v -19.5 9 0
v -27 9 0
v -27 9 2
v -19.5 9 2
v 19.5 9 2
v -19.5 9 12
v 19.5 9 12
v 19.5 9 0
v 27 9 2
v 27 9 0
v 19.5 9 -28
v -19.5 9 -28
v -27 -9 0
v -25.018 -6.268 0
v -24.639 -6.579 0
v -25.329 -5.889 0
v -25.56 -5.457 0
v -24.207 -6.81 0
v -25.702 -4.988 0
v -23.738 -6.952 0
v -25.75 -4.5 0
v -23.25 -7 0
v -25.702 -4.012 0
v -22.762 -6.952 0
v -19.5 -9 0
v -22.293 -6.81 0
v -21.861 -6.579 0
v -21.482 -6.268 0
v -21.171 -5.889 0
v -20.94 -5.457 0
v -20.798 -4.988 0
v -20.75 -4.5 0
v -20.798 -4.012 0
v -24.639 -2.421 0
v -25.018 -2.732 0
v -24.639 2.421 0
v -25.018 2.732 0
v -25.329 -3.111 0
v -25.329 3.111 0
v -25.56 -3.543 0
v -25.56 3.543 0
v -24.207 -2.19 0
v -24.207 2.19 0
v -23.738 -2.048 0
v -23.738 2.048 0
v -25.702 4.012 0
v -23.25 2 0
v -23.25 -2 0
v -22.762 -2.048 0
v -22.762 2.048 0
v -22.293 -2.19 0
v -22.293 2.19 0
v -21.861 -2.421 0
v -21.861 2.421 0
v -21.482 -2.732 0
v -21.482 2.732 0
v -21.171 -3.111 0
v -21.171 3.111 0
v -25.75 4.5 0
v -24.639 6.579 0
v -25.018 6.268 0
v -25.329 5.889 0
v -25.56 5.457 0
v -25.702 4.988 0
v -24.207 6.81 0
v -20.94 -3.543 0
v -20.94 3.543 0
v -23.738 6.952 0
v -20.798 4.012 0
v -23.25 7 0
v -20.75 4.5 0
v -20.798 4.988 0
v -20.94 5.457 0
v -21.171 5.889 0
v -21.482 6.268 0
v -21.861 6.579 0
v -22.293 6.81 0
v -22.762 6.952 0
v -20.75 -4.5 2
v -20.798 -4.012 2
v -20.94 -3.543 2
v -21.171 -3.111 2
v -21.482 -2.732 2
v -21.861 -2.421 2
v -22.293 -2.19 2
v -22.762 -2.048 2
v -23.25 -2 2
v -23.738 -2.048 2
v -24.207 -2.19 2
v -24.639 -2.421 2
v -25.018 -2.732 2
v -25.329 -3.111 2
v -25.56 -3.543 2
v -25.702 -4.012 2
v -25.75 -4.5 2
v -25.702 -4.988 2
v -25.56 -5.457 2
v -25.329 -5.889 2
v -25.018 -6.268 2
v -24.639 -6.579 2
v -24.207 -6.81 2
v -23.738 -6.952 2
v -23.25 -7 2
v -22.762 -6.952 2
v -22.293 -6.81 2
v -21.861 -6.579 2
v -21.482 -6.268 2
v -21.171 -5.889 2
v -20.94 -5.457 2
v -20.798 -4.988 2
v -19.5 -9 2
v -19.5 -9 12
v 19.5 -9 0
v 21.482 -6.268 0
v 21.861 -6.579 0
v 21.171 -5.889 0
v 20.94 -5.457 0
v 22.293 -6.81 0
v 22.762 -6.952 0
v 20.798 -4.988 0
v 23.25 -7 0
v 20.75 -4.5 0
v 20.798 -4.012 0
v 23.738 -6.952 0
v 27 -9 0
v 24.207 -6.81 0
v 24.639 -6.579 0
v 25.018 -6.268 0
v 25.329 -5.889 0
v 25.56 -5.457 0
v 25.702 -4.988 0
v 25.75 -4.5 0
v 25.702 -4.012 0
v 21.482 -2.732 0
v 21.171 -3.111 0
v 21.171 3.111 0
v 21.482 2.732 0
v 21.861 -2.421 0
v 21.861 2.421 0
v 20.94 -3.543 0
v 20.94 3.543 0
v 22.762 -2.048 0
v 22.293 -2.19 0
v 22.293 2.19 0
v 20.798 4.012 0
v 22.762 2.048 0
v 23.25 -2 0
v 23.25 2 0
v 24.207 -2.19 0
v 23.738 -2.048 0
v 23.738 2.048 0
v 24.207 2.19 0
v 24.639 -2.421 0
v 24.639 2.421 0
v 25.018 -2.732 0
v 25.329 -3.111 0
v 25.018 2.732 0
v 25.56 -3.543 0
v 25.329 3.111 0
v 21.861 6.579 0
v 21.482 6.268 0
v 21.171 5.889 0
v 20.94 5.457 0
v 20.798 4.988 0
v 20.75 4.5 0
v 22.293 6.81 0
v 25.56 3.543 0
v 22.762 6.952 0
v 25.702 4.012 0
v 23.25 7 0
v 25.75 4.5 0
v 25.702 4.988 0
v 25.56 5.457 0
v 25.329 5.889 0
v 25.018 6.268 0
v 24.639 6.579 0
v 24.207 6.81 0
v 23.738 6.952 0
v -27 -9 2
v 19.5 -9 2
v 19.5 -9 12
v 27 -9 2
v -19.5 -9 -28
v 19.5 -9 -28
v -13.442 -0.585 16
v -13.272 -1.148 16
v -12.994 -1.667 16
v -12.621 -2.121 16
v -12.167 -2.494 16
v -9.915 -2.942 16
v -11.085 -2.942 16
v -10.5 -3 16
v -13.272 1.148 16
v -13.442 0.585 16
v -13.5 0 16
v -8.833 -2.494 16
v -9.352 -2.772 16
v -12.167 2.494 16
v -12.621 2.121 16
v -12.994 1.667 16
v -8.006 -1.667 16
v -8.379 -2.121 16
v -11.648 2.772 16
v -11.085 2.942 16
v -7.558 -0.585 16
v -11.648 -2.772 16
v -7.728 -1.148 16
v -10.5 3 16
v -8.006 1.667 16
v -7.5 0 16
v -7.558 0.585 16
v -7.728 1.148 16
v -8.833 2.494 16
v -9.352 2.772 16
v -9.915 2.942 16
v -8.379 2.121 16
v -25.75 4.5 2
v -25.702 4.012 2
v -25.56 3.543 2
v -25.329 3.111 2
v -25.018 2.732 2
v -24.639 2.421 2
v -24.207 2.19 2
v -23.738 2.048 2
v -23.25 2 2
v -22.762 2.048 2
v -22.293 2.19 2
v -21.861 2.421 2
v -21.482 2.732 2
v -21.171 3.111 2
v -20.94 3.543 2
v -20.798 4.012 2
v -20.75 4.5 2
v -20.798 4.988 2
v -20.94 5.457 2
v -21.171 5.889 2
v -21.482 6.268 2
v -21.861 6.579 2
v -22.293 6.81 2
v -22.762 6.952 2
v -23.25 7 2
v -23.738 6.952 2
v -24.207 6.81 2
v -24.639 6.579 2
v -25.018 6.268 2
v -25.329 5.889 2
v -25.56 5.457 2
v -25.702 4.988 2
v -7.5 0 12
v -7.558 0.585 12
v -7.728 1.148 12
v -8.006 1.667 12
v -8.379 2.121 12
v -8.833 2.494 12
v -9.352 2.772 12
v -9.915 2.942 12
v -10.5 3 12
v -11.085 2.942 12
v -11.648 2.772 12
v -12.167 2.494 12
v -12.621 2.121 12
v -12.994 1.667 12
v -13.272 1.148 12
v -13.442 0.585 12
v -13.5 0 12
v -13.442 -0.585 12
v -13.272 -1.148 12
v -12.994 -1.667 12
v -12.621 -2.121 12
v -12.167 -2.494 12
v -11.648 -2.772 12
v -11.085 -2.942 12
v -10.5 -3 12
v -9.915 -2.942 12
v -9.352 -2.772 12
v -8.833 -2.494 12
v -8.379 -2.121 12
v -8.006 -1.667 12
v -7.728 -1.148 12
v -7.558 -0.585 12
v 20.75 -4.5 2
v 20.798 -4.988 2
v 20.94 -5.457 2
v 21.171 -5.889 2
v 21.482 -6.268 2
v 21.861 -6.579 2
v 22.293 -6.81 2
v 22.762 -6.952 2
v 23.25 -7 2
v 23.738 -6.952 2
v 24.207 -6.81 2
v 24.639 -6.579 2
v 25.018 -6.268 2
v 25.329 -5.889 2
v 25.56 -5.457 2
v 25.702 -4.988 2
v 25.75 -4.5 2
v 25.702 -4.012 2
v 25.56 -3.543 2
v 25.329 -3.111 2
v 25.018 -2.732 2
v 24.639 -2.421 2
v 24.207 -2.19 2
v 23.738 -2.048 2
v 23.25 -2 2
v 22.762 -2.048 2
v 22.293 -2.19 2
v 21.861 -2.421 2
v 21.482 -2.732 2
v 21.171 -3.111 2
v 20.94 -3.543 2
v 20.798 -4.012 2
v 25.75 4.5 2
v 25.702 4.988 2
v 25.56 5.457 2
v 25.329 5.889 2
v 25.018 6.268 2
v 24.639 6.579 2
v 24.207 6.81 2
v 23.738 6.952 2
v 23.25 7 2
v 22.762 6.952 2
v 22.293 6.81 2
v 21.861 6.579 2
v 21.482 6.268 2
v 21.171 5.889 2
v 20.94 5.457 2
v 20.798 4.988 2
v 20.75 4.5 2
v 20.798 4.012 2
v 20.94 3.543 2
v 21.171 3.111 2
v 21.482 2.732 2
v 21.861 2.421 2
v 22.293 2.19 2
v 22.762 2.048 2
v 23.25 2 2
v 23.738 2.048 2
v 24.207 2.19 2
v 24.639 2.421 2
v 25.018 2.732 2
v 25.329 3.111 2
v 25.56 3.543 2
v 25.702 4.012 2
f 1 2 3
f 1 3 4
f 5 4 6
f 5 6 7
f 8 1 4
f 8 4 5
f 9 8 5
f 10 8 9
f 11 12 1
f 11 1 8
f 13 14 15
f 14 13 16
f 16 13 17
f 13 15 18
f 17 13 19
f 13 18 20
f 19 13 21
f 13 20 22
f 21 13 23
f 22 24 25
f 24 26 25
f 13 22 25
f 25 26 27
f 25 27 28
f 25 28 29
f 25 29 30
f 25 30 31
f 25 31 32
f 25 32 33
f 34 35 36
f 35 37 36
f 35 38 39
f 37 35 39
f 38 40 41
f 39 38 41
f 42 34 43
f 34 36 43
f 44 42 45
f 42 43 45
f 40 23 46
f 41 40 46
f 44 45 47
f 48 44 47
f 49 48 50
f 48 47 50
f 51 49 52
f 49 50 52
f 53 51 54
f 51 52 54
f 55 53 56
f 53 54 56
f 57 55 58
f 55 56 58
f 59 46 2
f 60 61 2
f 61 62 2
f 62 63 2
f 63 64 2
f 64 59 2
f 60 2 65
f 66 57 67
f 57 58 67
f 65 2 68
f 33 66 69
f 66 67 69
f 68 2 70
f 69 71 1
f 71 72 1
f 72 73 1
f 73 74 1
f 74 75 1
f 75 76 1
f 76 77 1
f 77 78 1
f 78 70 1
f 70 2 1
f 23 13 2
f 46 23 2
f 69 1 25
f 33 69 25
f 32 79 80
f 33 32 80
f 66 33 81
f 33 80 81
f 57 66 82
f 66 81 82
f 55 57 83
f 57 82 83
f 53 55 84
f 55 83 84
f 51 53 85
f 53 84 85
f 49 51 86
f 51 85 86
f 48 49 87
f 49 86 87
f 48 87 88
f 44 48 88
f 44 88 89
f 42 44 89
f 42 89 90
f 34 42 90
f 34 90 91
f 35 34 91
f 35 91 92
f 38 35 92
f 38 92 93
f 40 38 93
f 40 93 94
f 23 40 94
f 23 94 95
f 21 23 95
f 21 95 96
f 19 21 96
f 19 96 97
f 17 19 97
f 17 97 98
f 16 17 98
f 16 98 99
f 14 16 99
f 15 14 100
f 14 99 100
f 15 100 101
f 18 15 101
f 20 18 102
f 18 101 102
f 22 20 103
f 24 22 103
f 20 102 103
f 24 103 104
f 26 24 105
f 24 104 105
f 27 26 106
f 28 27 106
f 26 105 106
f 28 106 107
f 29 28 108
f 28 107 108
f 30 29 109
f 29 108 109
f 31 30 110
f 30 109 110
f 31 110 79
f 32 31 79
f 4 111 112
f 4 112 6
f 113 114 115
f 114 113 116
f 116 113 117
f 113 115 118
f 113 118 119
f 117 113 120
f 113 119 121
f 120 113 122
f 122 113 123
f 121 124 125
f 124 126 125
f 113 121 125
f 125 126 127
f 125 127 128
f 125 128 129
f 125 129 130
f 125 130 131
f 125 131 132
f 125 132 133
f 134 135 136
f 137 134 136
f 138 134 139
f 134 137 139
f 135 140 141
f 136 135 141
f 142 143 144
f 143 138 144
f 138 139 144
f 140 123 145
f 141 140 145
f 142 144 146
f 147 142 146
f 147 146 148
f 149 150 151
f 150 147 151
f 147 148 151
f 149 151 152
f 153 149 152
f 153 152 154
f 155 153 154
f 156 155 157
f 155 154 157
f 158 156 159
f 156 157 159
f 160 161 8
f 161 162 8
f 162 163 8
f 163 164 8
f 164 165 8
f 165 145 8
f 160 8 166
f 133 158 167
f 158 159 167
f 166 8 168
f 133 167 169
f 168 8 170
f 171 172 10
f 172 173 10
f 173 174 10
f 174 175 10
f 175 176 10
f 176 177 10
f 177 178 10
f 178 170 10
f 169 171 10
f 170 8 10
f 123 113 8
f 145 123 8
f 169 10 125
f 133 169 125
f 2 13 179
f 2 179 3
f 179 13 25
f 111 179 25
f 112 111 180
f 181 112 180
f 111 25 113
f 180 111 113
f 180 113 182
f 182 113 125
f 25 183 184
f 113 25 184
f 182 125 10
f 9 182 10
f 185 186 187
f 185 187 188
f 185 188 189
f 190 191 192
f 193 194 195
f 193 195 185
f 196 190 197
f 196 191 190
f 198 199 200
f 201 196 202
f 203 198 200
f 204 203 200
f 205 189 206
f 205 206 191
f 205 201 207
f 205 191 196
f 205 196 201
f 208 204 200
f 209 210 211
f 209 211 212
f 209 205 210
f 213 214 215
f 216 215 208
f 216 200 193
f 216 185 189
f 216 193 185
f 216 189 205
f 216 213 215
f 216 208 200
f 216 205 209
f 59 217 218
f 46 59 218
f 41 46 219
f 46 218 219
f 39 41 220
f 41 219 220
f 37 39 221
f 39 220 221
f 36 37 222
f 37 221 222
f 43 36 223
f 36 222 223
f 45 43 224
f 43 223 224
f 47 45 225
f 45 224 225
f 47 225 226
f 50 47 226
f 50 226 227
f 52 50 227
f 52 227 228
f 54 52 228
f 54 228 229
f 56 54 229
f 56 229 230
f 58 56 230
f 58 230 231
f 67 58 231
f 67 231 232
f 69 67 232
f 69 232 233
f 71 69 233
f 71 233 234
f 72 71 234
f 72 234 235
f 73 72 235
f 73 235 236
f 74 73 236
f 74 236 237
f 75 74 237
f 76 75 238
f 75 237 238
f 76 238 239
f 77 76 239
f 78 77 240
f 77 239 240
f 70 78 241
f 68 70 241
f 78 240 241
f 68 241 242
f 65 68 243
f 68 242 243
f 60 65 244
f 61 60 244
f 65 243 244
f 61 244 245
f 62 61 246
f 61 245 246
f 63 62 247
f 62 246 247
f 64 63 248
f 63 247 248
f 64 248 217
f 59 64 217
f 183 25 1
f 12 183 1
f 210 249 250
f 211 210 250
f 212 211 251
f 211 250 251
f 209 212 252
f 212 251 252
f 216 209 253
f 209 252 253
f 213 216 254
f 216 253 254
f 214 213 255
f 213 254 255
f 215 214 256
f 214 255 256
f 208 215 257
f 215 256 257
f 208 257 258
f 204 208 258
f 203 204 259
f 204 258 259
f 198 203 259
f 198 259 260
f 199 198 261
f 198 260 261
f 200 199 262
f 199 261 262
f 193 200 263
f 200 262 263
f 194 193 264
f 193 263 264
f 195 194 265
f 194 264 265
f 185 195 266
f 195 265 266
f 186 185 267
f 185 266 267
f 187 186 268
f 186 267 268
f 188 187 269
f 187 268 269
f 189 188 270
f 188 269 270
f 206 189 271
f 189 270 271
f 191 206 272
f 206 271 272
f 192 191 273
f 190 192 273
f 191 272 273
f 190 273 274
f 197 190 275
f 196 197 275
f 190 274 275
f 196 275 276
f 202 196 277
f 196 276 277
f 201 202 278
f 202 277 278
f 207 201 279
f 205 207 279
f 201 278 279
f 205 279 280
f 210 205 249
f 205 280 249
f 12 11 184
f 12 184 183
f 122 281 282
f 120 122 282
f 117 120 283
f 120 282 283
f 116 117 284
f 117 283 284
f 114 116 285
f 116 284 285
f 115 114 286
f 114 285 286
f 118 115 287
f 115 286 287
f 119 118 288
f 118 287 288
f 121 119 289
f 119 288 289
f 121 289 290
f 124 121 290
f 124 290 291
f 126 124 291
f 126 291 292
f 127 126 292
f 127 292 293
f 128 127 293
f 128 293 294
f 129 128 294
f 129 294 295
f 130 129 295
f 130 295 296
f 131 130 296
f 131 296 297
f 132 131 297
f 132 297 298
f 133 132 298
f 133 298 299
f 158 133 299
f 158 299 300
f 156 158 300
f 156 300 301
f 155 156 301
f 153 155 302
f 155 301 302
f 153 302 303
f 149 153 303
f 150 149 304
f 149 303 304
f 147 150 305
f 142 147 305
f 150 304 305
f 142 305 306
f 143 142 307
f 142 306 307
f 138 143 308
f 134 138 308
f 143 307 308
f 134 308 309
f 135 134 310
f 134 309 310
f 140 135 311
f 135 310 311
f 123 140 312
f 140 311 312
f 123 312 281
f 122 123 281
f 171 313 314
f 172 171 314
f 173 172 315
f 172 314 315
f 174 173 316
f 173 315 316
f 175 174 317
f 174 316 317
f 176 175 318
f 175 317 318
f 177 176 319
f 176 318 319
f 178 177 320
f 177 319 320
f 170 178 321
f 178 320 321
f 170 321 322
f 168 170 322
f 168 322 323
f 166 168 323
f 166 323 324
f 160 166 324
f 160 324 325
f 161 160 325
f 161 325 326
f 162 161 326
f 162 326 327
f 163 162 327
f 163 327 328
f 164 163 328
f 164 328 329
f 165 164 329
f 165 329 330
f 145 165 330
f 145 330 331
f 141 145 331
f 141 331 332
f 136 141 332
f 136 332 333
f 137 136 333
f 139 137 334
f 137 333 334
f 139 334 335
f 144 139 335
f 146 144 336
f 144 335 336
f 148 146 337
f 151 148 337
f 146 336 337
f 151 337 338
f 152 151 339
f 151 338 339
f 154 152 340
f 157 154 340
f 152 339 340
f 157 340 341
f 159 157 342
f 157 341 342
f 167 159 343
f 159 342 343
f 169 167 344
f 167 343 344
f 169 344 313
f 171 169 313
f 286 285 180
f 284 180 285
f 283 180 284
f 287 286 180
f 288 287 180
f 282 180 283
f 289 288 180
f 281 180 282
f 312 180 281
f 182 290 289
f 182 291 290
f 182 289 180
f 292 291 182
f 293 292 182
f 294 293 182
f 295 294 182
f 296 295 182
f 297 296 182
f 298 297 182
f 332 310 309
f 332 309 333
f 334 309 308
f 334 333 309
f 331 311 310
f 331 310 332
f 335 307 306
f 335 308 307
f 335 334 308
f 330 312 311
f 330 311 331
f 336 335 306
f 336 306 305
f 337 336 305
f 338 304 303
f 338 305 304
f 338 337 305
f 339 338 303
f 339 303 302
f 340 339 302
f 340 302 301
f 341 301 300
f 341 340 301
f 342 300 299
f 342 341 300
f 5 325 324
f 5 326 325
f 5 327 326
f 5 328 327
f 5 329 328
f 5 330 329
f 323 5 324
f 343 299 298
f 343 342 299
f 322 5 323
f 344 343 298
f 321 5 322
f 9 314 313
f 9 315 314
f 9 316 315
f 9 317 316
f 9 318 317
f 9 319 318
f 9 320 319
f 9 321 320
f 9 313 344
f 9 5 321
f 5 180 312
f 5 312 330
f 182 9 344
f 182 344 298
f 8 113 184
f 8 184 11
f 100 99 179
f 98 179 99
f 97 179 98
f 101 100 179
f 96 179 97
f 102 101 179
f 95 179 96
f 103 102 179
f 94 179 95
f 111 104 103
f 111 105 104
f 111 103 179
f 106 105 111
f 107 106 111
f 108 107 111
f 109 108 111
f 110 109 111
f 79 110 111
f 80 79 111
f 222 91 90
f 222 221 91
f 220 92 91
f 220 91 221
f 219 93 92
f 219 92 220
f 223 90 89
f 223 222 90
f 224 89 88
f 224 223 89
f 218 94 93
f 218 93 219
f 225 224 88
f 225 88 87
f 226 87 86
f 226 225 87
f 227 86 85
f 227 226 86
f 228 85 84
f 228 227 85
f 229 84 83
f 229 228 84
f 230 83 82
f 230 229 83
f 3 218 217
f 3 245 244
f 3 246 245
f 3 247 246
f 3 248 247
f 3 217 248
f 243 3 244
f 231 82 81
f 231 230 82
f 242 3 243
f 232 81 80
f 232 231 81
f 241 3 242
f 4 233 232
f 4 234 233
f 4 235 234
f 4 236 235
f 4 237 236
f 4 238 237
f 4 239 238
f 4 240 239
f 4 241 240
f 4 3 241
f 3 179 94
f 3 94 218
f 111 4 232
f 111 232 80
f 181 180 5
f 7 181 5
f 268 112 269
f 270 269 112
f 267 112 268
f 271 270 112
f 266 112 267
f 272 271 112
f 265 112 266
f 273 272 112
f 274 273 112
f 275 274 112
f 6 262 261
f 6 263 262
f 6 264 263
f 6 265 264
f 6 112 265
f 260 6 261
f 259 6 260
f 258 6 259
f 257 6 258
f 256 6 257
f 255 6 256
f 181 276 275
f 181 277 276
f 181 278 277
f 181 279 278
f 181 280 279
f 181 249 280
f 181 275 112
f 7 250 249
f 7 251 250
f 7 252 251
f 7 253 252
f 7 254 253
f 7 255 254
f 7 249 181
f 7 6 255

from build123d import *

# Parameters (mm, degrees)
SKETCH_1_W          = 54
SKETCH_1_H          = 18
EXTRUDE_1_DEPTH     = 2
SKETCH_2_W          = 39
SKETCH_2_H          = 18
EXTRUDE_2_DEPTH     = 10
SKETCH_3_R          = 3
EXTRUDE_3_DEPTH     = 4
SKETCH_4_W          = 39
SKETCH_4_H          = 18
EXTRUDE_4_DEPTH     = 28
SKETCH_6_R          = 2.5
CUT_EXTRUDE_1_DEPTH = 42.352146256


with BuildPart() as part:
    # 草图1 → 凸台-拉伸1 (new body)
    with BuildSketch(Plane.XY):
        Rectangle(SKETCH_1_W, SKETCH_1_H)
    extrude(amount=EXTRUDE_1_DEPTH)

    # 草图2 → 凸台-拉伸2 (add)
    with BuildSketch(Plane.XY.offset(2)):
        Rectangle(SKETCH_2_W, SKETCH_2_H)
    extrude(amount=EXTRUDE_2_DEPTH)

    # 草图3 → 凸台-拉伸3 (add)
    with BuildSketch(Plane.XY.offset(12)):
        with Locations((-10.5, 0)):
            Circle(SKETCH_3_R)
    extrude(amount=EXTRUDE_3_DEPTH)

    # 草图4 → 凸台-拉伸4 (add)
    with BuildSketch(Plane(origin=(0, 0, 0), x_dir=(-1, 0, 0), z_dir=(0, 0, -1))):
        Rectangle(SKETCH_4_W, SKETCH_4_H)
    extrude(amount=EXTRUDE_4_DEPTH)

    # 草图6 → 切除-拉伸1 (cut, through all)
    with BuildSketch(Plane.XY.offset(2)):
        with Locations((23.25, 4.5)):
            Circle(SKETCH_6_R)
        with Locations(Location((23.25, -4.5, 0), (0, 0, 180))):
            Circle(SKETCH_6_R)
        with Locations((-23.25, -4.5)):
            Circle(SKETCH_6_R)
        with Locations(Location((-23.25, 4.5, 0), (0, 0, 180))):
            Circle(SKETCH_6_R)
    extrude(amount=-CUT_EXTRUDE_1_DEPTH, mode=Mode.SUBTRACT)


solid = part.part
